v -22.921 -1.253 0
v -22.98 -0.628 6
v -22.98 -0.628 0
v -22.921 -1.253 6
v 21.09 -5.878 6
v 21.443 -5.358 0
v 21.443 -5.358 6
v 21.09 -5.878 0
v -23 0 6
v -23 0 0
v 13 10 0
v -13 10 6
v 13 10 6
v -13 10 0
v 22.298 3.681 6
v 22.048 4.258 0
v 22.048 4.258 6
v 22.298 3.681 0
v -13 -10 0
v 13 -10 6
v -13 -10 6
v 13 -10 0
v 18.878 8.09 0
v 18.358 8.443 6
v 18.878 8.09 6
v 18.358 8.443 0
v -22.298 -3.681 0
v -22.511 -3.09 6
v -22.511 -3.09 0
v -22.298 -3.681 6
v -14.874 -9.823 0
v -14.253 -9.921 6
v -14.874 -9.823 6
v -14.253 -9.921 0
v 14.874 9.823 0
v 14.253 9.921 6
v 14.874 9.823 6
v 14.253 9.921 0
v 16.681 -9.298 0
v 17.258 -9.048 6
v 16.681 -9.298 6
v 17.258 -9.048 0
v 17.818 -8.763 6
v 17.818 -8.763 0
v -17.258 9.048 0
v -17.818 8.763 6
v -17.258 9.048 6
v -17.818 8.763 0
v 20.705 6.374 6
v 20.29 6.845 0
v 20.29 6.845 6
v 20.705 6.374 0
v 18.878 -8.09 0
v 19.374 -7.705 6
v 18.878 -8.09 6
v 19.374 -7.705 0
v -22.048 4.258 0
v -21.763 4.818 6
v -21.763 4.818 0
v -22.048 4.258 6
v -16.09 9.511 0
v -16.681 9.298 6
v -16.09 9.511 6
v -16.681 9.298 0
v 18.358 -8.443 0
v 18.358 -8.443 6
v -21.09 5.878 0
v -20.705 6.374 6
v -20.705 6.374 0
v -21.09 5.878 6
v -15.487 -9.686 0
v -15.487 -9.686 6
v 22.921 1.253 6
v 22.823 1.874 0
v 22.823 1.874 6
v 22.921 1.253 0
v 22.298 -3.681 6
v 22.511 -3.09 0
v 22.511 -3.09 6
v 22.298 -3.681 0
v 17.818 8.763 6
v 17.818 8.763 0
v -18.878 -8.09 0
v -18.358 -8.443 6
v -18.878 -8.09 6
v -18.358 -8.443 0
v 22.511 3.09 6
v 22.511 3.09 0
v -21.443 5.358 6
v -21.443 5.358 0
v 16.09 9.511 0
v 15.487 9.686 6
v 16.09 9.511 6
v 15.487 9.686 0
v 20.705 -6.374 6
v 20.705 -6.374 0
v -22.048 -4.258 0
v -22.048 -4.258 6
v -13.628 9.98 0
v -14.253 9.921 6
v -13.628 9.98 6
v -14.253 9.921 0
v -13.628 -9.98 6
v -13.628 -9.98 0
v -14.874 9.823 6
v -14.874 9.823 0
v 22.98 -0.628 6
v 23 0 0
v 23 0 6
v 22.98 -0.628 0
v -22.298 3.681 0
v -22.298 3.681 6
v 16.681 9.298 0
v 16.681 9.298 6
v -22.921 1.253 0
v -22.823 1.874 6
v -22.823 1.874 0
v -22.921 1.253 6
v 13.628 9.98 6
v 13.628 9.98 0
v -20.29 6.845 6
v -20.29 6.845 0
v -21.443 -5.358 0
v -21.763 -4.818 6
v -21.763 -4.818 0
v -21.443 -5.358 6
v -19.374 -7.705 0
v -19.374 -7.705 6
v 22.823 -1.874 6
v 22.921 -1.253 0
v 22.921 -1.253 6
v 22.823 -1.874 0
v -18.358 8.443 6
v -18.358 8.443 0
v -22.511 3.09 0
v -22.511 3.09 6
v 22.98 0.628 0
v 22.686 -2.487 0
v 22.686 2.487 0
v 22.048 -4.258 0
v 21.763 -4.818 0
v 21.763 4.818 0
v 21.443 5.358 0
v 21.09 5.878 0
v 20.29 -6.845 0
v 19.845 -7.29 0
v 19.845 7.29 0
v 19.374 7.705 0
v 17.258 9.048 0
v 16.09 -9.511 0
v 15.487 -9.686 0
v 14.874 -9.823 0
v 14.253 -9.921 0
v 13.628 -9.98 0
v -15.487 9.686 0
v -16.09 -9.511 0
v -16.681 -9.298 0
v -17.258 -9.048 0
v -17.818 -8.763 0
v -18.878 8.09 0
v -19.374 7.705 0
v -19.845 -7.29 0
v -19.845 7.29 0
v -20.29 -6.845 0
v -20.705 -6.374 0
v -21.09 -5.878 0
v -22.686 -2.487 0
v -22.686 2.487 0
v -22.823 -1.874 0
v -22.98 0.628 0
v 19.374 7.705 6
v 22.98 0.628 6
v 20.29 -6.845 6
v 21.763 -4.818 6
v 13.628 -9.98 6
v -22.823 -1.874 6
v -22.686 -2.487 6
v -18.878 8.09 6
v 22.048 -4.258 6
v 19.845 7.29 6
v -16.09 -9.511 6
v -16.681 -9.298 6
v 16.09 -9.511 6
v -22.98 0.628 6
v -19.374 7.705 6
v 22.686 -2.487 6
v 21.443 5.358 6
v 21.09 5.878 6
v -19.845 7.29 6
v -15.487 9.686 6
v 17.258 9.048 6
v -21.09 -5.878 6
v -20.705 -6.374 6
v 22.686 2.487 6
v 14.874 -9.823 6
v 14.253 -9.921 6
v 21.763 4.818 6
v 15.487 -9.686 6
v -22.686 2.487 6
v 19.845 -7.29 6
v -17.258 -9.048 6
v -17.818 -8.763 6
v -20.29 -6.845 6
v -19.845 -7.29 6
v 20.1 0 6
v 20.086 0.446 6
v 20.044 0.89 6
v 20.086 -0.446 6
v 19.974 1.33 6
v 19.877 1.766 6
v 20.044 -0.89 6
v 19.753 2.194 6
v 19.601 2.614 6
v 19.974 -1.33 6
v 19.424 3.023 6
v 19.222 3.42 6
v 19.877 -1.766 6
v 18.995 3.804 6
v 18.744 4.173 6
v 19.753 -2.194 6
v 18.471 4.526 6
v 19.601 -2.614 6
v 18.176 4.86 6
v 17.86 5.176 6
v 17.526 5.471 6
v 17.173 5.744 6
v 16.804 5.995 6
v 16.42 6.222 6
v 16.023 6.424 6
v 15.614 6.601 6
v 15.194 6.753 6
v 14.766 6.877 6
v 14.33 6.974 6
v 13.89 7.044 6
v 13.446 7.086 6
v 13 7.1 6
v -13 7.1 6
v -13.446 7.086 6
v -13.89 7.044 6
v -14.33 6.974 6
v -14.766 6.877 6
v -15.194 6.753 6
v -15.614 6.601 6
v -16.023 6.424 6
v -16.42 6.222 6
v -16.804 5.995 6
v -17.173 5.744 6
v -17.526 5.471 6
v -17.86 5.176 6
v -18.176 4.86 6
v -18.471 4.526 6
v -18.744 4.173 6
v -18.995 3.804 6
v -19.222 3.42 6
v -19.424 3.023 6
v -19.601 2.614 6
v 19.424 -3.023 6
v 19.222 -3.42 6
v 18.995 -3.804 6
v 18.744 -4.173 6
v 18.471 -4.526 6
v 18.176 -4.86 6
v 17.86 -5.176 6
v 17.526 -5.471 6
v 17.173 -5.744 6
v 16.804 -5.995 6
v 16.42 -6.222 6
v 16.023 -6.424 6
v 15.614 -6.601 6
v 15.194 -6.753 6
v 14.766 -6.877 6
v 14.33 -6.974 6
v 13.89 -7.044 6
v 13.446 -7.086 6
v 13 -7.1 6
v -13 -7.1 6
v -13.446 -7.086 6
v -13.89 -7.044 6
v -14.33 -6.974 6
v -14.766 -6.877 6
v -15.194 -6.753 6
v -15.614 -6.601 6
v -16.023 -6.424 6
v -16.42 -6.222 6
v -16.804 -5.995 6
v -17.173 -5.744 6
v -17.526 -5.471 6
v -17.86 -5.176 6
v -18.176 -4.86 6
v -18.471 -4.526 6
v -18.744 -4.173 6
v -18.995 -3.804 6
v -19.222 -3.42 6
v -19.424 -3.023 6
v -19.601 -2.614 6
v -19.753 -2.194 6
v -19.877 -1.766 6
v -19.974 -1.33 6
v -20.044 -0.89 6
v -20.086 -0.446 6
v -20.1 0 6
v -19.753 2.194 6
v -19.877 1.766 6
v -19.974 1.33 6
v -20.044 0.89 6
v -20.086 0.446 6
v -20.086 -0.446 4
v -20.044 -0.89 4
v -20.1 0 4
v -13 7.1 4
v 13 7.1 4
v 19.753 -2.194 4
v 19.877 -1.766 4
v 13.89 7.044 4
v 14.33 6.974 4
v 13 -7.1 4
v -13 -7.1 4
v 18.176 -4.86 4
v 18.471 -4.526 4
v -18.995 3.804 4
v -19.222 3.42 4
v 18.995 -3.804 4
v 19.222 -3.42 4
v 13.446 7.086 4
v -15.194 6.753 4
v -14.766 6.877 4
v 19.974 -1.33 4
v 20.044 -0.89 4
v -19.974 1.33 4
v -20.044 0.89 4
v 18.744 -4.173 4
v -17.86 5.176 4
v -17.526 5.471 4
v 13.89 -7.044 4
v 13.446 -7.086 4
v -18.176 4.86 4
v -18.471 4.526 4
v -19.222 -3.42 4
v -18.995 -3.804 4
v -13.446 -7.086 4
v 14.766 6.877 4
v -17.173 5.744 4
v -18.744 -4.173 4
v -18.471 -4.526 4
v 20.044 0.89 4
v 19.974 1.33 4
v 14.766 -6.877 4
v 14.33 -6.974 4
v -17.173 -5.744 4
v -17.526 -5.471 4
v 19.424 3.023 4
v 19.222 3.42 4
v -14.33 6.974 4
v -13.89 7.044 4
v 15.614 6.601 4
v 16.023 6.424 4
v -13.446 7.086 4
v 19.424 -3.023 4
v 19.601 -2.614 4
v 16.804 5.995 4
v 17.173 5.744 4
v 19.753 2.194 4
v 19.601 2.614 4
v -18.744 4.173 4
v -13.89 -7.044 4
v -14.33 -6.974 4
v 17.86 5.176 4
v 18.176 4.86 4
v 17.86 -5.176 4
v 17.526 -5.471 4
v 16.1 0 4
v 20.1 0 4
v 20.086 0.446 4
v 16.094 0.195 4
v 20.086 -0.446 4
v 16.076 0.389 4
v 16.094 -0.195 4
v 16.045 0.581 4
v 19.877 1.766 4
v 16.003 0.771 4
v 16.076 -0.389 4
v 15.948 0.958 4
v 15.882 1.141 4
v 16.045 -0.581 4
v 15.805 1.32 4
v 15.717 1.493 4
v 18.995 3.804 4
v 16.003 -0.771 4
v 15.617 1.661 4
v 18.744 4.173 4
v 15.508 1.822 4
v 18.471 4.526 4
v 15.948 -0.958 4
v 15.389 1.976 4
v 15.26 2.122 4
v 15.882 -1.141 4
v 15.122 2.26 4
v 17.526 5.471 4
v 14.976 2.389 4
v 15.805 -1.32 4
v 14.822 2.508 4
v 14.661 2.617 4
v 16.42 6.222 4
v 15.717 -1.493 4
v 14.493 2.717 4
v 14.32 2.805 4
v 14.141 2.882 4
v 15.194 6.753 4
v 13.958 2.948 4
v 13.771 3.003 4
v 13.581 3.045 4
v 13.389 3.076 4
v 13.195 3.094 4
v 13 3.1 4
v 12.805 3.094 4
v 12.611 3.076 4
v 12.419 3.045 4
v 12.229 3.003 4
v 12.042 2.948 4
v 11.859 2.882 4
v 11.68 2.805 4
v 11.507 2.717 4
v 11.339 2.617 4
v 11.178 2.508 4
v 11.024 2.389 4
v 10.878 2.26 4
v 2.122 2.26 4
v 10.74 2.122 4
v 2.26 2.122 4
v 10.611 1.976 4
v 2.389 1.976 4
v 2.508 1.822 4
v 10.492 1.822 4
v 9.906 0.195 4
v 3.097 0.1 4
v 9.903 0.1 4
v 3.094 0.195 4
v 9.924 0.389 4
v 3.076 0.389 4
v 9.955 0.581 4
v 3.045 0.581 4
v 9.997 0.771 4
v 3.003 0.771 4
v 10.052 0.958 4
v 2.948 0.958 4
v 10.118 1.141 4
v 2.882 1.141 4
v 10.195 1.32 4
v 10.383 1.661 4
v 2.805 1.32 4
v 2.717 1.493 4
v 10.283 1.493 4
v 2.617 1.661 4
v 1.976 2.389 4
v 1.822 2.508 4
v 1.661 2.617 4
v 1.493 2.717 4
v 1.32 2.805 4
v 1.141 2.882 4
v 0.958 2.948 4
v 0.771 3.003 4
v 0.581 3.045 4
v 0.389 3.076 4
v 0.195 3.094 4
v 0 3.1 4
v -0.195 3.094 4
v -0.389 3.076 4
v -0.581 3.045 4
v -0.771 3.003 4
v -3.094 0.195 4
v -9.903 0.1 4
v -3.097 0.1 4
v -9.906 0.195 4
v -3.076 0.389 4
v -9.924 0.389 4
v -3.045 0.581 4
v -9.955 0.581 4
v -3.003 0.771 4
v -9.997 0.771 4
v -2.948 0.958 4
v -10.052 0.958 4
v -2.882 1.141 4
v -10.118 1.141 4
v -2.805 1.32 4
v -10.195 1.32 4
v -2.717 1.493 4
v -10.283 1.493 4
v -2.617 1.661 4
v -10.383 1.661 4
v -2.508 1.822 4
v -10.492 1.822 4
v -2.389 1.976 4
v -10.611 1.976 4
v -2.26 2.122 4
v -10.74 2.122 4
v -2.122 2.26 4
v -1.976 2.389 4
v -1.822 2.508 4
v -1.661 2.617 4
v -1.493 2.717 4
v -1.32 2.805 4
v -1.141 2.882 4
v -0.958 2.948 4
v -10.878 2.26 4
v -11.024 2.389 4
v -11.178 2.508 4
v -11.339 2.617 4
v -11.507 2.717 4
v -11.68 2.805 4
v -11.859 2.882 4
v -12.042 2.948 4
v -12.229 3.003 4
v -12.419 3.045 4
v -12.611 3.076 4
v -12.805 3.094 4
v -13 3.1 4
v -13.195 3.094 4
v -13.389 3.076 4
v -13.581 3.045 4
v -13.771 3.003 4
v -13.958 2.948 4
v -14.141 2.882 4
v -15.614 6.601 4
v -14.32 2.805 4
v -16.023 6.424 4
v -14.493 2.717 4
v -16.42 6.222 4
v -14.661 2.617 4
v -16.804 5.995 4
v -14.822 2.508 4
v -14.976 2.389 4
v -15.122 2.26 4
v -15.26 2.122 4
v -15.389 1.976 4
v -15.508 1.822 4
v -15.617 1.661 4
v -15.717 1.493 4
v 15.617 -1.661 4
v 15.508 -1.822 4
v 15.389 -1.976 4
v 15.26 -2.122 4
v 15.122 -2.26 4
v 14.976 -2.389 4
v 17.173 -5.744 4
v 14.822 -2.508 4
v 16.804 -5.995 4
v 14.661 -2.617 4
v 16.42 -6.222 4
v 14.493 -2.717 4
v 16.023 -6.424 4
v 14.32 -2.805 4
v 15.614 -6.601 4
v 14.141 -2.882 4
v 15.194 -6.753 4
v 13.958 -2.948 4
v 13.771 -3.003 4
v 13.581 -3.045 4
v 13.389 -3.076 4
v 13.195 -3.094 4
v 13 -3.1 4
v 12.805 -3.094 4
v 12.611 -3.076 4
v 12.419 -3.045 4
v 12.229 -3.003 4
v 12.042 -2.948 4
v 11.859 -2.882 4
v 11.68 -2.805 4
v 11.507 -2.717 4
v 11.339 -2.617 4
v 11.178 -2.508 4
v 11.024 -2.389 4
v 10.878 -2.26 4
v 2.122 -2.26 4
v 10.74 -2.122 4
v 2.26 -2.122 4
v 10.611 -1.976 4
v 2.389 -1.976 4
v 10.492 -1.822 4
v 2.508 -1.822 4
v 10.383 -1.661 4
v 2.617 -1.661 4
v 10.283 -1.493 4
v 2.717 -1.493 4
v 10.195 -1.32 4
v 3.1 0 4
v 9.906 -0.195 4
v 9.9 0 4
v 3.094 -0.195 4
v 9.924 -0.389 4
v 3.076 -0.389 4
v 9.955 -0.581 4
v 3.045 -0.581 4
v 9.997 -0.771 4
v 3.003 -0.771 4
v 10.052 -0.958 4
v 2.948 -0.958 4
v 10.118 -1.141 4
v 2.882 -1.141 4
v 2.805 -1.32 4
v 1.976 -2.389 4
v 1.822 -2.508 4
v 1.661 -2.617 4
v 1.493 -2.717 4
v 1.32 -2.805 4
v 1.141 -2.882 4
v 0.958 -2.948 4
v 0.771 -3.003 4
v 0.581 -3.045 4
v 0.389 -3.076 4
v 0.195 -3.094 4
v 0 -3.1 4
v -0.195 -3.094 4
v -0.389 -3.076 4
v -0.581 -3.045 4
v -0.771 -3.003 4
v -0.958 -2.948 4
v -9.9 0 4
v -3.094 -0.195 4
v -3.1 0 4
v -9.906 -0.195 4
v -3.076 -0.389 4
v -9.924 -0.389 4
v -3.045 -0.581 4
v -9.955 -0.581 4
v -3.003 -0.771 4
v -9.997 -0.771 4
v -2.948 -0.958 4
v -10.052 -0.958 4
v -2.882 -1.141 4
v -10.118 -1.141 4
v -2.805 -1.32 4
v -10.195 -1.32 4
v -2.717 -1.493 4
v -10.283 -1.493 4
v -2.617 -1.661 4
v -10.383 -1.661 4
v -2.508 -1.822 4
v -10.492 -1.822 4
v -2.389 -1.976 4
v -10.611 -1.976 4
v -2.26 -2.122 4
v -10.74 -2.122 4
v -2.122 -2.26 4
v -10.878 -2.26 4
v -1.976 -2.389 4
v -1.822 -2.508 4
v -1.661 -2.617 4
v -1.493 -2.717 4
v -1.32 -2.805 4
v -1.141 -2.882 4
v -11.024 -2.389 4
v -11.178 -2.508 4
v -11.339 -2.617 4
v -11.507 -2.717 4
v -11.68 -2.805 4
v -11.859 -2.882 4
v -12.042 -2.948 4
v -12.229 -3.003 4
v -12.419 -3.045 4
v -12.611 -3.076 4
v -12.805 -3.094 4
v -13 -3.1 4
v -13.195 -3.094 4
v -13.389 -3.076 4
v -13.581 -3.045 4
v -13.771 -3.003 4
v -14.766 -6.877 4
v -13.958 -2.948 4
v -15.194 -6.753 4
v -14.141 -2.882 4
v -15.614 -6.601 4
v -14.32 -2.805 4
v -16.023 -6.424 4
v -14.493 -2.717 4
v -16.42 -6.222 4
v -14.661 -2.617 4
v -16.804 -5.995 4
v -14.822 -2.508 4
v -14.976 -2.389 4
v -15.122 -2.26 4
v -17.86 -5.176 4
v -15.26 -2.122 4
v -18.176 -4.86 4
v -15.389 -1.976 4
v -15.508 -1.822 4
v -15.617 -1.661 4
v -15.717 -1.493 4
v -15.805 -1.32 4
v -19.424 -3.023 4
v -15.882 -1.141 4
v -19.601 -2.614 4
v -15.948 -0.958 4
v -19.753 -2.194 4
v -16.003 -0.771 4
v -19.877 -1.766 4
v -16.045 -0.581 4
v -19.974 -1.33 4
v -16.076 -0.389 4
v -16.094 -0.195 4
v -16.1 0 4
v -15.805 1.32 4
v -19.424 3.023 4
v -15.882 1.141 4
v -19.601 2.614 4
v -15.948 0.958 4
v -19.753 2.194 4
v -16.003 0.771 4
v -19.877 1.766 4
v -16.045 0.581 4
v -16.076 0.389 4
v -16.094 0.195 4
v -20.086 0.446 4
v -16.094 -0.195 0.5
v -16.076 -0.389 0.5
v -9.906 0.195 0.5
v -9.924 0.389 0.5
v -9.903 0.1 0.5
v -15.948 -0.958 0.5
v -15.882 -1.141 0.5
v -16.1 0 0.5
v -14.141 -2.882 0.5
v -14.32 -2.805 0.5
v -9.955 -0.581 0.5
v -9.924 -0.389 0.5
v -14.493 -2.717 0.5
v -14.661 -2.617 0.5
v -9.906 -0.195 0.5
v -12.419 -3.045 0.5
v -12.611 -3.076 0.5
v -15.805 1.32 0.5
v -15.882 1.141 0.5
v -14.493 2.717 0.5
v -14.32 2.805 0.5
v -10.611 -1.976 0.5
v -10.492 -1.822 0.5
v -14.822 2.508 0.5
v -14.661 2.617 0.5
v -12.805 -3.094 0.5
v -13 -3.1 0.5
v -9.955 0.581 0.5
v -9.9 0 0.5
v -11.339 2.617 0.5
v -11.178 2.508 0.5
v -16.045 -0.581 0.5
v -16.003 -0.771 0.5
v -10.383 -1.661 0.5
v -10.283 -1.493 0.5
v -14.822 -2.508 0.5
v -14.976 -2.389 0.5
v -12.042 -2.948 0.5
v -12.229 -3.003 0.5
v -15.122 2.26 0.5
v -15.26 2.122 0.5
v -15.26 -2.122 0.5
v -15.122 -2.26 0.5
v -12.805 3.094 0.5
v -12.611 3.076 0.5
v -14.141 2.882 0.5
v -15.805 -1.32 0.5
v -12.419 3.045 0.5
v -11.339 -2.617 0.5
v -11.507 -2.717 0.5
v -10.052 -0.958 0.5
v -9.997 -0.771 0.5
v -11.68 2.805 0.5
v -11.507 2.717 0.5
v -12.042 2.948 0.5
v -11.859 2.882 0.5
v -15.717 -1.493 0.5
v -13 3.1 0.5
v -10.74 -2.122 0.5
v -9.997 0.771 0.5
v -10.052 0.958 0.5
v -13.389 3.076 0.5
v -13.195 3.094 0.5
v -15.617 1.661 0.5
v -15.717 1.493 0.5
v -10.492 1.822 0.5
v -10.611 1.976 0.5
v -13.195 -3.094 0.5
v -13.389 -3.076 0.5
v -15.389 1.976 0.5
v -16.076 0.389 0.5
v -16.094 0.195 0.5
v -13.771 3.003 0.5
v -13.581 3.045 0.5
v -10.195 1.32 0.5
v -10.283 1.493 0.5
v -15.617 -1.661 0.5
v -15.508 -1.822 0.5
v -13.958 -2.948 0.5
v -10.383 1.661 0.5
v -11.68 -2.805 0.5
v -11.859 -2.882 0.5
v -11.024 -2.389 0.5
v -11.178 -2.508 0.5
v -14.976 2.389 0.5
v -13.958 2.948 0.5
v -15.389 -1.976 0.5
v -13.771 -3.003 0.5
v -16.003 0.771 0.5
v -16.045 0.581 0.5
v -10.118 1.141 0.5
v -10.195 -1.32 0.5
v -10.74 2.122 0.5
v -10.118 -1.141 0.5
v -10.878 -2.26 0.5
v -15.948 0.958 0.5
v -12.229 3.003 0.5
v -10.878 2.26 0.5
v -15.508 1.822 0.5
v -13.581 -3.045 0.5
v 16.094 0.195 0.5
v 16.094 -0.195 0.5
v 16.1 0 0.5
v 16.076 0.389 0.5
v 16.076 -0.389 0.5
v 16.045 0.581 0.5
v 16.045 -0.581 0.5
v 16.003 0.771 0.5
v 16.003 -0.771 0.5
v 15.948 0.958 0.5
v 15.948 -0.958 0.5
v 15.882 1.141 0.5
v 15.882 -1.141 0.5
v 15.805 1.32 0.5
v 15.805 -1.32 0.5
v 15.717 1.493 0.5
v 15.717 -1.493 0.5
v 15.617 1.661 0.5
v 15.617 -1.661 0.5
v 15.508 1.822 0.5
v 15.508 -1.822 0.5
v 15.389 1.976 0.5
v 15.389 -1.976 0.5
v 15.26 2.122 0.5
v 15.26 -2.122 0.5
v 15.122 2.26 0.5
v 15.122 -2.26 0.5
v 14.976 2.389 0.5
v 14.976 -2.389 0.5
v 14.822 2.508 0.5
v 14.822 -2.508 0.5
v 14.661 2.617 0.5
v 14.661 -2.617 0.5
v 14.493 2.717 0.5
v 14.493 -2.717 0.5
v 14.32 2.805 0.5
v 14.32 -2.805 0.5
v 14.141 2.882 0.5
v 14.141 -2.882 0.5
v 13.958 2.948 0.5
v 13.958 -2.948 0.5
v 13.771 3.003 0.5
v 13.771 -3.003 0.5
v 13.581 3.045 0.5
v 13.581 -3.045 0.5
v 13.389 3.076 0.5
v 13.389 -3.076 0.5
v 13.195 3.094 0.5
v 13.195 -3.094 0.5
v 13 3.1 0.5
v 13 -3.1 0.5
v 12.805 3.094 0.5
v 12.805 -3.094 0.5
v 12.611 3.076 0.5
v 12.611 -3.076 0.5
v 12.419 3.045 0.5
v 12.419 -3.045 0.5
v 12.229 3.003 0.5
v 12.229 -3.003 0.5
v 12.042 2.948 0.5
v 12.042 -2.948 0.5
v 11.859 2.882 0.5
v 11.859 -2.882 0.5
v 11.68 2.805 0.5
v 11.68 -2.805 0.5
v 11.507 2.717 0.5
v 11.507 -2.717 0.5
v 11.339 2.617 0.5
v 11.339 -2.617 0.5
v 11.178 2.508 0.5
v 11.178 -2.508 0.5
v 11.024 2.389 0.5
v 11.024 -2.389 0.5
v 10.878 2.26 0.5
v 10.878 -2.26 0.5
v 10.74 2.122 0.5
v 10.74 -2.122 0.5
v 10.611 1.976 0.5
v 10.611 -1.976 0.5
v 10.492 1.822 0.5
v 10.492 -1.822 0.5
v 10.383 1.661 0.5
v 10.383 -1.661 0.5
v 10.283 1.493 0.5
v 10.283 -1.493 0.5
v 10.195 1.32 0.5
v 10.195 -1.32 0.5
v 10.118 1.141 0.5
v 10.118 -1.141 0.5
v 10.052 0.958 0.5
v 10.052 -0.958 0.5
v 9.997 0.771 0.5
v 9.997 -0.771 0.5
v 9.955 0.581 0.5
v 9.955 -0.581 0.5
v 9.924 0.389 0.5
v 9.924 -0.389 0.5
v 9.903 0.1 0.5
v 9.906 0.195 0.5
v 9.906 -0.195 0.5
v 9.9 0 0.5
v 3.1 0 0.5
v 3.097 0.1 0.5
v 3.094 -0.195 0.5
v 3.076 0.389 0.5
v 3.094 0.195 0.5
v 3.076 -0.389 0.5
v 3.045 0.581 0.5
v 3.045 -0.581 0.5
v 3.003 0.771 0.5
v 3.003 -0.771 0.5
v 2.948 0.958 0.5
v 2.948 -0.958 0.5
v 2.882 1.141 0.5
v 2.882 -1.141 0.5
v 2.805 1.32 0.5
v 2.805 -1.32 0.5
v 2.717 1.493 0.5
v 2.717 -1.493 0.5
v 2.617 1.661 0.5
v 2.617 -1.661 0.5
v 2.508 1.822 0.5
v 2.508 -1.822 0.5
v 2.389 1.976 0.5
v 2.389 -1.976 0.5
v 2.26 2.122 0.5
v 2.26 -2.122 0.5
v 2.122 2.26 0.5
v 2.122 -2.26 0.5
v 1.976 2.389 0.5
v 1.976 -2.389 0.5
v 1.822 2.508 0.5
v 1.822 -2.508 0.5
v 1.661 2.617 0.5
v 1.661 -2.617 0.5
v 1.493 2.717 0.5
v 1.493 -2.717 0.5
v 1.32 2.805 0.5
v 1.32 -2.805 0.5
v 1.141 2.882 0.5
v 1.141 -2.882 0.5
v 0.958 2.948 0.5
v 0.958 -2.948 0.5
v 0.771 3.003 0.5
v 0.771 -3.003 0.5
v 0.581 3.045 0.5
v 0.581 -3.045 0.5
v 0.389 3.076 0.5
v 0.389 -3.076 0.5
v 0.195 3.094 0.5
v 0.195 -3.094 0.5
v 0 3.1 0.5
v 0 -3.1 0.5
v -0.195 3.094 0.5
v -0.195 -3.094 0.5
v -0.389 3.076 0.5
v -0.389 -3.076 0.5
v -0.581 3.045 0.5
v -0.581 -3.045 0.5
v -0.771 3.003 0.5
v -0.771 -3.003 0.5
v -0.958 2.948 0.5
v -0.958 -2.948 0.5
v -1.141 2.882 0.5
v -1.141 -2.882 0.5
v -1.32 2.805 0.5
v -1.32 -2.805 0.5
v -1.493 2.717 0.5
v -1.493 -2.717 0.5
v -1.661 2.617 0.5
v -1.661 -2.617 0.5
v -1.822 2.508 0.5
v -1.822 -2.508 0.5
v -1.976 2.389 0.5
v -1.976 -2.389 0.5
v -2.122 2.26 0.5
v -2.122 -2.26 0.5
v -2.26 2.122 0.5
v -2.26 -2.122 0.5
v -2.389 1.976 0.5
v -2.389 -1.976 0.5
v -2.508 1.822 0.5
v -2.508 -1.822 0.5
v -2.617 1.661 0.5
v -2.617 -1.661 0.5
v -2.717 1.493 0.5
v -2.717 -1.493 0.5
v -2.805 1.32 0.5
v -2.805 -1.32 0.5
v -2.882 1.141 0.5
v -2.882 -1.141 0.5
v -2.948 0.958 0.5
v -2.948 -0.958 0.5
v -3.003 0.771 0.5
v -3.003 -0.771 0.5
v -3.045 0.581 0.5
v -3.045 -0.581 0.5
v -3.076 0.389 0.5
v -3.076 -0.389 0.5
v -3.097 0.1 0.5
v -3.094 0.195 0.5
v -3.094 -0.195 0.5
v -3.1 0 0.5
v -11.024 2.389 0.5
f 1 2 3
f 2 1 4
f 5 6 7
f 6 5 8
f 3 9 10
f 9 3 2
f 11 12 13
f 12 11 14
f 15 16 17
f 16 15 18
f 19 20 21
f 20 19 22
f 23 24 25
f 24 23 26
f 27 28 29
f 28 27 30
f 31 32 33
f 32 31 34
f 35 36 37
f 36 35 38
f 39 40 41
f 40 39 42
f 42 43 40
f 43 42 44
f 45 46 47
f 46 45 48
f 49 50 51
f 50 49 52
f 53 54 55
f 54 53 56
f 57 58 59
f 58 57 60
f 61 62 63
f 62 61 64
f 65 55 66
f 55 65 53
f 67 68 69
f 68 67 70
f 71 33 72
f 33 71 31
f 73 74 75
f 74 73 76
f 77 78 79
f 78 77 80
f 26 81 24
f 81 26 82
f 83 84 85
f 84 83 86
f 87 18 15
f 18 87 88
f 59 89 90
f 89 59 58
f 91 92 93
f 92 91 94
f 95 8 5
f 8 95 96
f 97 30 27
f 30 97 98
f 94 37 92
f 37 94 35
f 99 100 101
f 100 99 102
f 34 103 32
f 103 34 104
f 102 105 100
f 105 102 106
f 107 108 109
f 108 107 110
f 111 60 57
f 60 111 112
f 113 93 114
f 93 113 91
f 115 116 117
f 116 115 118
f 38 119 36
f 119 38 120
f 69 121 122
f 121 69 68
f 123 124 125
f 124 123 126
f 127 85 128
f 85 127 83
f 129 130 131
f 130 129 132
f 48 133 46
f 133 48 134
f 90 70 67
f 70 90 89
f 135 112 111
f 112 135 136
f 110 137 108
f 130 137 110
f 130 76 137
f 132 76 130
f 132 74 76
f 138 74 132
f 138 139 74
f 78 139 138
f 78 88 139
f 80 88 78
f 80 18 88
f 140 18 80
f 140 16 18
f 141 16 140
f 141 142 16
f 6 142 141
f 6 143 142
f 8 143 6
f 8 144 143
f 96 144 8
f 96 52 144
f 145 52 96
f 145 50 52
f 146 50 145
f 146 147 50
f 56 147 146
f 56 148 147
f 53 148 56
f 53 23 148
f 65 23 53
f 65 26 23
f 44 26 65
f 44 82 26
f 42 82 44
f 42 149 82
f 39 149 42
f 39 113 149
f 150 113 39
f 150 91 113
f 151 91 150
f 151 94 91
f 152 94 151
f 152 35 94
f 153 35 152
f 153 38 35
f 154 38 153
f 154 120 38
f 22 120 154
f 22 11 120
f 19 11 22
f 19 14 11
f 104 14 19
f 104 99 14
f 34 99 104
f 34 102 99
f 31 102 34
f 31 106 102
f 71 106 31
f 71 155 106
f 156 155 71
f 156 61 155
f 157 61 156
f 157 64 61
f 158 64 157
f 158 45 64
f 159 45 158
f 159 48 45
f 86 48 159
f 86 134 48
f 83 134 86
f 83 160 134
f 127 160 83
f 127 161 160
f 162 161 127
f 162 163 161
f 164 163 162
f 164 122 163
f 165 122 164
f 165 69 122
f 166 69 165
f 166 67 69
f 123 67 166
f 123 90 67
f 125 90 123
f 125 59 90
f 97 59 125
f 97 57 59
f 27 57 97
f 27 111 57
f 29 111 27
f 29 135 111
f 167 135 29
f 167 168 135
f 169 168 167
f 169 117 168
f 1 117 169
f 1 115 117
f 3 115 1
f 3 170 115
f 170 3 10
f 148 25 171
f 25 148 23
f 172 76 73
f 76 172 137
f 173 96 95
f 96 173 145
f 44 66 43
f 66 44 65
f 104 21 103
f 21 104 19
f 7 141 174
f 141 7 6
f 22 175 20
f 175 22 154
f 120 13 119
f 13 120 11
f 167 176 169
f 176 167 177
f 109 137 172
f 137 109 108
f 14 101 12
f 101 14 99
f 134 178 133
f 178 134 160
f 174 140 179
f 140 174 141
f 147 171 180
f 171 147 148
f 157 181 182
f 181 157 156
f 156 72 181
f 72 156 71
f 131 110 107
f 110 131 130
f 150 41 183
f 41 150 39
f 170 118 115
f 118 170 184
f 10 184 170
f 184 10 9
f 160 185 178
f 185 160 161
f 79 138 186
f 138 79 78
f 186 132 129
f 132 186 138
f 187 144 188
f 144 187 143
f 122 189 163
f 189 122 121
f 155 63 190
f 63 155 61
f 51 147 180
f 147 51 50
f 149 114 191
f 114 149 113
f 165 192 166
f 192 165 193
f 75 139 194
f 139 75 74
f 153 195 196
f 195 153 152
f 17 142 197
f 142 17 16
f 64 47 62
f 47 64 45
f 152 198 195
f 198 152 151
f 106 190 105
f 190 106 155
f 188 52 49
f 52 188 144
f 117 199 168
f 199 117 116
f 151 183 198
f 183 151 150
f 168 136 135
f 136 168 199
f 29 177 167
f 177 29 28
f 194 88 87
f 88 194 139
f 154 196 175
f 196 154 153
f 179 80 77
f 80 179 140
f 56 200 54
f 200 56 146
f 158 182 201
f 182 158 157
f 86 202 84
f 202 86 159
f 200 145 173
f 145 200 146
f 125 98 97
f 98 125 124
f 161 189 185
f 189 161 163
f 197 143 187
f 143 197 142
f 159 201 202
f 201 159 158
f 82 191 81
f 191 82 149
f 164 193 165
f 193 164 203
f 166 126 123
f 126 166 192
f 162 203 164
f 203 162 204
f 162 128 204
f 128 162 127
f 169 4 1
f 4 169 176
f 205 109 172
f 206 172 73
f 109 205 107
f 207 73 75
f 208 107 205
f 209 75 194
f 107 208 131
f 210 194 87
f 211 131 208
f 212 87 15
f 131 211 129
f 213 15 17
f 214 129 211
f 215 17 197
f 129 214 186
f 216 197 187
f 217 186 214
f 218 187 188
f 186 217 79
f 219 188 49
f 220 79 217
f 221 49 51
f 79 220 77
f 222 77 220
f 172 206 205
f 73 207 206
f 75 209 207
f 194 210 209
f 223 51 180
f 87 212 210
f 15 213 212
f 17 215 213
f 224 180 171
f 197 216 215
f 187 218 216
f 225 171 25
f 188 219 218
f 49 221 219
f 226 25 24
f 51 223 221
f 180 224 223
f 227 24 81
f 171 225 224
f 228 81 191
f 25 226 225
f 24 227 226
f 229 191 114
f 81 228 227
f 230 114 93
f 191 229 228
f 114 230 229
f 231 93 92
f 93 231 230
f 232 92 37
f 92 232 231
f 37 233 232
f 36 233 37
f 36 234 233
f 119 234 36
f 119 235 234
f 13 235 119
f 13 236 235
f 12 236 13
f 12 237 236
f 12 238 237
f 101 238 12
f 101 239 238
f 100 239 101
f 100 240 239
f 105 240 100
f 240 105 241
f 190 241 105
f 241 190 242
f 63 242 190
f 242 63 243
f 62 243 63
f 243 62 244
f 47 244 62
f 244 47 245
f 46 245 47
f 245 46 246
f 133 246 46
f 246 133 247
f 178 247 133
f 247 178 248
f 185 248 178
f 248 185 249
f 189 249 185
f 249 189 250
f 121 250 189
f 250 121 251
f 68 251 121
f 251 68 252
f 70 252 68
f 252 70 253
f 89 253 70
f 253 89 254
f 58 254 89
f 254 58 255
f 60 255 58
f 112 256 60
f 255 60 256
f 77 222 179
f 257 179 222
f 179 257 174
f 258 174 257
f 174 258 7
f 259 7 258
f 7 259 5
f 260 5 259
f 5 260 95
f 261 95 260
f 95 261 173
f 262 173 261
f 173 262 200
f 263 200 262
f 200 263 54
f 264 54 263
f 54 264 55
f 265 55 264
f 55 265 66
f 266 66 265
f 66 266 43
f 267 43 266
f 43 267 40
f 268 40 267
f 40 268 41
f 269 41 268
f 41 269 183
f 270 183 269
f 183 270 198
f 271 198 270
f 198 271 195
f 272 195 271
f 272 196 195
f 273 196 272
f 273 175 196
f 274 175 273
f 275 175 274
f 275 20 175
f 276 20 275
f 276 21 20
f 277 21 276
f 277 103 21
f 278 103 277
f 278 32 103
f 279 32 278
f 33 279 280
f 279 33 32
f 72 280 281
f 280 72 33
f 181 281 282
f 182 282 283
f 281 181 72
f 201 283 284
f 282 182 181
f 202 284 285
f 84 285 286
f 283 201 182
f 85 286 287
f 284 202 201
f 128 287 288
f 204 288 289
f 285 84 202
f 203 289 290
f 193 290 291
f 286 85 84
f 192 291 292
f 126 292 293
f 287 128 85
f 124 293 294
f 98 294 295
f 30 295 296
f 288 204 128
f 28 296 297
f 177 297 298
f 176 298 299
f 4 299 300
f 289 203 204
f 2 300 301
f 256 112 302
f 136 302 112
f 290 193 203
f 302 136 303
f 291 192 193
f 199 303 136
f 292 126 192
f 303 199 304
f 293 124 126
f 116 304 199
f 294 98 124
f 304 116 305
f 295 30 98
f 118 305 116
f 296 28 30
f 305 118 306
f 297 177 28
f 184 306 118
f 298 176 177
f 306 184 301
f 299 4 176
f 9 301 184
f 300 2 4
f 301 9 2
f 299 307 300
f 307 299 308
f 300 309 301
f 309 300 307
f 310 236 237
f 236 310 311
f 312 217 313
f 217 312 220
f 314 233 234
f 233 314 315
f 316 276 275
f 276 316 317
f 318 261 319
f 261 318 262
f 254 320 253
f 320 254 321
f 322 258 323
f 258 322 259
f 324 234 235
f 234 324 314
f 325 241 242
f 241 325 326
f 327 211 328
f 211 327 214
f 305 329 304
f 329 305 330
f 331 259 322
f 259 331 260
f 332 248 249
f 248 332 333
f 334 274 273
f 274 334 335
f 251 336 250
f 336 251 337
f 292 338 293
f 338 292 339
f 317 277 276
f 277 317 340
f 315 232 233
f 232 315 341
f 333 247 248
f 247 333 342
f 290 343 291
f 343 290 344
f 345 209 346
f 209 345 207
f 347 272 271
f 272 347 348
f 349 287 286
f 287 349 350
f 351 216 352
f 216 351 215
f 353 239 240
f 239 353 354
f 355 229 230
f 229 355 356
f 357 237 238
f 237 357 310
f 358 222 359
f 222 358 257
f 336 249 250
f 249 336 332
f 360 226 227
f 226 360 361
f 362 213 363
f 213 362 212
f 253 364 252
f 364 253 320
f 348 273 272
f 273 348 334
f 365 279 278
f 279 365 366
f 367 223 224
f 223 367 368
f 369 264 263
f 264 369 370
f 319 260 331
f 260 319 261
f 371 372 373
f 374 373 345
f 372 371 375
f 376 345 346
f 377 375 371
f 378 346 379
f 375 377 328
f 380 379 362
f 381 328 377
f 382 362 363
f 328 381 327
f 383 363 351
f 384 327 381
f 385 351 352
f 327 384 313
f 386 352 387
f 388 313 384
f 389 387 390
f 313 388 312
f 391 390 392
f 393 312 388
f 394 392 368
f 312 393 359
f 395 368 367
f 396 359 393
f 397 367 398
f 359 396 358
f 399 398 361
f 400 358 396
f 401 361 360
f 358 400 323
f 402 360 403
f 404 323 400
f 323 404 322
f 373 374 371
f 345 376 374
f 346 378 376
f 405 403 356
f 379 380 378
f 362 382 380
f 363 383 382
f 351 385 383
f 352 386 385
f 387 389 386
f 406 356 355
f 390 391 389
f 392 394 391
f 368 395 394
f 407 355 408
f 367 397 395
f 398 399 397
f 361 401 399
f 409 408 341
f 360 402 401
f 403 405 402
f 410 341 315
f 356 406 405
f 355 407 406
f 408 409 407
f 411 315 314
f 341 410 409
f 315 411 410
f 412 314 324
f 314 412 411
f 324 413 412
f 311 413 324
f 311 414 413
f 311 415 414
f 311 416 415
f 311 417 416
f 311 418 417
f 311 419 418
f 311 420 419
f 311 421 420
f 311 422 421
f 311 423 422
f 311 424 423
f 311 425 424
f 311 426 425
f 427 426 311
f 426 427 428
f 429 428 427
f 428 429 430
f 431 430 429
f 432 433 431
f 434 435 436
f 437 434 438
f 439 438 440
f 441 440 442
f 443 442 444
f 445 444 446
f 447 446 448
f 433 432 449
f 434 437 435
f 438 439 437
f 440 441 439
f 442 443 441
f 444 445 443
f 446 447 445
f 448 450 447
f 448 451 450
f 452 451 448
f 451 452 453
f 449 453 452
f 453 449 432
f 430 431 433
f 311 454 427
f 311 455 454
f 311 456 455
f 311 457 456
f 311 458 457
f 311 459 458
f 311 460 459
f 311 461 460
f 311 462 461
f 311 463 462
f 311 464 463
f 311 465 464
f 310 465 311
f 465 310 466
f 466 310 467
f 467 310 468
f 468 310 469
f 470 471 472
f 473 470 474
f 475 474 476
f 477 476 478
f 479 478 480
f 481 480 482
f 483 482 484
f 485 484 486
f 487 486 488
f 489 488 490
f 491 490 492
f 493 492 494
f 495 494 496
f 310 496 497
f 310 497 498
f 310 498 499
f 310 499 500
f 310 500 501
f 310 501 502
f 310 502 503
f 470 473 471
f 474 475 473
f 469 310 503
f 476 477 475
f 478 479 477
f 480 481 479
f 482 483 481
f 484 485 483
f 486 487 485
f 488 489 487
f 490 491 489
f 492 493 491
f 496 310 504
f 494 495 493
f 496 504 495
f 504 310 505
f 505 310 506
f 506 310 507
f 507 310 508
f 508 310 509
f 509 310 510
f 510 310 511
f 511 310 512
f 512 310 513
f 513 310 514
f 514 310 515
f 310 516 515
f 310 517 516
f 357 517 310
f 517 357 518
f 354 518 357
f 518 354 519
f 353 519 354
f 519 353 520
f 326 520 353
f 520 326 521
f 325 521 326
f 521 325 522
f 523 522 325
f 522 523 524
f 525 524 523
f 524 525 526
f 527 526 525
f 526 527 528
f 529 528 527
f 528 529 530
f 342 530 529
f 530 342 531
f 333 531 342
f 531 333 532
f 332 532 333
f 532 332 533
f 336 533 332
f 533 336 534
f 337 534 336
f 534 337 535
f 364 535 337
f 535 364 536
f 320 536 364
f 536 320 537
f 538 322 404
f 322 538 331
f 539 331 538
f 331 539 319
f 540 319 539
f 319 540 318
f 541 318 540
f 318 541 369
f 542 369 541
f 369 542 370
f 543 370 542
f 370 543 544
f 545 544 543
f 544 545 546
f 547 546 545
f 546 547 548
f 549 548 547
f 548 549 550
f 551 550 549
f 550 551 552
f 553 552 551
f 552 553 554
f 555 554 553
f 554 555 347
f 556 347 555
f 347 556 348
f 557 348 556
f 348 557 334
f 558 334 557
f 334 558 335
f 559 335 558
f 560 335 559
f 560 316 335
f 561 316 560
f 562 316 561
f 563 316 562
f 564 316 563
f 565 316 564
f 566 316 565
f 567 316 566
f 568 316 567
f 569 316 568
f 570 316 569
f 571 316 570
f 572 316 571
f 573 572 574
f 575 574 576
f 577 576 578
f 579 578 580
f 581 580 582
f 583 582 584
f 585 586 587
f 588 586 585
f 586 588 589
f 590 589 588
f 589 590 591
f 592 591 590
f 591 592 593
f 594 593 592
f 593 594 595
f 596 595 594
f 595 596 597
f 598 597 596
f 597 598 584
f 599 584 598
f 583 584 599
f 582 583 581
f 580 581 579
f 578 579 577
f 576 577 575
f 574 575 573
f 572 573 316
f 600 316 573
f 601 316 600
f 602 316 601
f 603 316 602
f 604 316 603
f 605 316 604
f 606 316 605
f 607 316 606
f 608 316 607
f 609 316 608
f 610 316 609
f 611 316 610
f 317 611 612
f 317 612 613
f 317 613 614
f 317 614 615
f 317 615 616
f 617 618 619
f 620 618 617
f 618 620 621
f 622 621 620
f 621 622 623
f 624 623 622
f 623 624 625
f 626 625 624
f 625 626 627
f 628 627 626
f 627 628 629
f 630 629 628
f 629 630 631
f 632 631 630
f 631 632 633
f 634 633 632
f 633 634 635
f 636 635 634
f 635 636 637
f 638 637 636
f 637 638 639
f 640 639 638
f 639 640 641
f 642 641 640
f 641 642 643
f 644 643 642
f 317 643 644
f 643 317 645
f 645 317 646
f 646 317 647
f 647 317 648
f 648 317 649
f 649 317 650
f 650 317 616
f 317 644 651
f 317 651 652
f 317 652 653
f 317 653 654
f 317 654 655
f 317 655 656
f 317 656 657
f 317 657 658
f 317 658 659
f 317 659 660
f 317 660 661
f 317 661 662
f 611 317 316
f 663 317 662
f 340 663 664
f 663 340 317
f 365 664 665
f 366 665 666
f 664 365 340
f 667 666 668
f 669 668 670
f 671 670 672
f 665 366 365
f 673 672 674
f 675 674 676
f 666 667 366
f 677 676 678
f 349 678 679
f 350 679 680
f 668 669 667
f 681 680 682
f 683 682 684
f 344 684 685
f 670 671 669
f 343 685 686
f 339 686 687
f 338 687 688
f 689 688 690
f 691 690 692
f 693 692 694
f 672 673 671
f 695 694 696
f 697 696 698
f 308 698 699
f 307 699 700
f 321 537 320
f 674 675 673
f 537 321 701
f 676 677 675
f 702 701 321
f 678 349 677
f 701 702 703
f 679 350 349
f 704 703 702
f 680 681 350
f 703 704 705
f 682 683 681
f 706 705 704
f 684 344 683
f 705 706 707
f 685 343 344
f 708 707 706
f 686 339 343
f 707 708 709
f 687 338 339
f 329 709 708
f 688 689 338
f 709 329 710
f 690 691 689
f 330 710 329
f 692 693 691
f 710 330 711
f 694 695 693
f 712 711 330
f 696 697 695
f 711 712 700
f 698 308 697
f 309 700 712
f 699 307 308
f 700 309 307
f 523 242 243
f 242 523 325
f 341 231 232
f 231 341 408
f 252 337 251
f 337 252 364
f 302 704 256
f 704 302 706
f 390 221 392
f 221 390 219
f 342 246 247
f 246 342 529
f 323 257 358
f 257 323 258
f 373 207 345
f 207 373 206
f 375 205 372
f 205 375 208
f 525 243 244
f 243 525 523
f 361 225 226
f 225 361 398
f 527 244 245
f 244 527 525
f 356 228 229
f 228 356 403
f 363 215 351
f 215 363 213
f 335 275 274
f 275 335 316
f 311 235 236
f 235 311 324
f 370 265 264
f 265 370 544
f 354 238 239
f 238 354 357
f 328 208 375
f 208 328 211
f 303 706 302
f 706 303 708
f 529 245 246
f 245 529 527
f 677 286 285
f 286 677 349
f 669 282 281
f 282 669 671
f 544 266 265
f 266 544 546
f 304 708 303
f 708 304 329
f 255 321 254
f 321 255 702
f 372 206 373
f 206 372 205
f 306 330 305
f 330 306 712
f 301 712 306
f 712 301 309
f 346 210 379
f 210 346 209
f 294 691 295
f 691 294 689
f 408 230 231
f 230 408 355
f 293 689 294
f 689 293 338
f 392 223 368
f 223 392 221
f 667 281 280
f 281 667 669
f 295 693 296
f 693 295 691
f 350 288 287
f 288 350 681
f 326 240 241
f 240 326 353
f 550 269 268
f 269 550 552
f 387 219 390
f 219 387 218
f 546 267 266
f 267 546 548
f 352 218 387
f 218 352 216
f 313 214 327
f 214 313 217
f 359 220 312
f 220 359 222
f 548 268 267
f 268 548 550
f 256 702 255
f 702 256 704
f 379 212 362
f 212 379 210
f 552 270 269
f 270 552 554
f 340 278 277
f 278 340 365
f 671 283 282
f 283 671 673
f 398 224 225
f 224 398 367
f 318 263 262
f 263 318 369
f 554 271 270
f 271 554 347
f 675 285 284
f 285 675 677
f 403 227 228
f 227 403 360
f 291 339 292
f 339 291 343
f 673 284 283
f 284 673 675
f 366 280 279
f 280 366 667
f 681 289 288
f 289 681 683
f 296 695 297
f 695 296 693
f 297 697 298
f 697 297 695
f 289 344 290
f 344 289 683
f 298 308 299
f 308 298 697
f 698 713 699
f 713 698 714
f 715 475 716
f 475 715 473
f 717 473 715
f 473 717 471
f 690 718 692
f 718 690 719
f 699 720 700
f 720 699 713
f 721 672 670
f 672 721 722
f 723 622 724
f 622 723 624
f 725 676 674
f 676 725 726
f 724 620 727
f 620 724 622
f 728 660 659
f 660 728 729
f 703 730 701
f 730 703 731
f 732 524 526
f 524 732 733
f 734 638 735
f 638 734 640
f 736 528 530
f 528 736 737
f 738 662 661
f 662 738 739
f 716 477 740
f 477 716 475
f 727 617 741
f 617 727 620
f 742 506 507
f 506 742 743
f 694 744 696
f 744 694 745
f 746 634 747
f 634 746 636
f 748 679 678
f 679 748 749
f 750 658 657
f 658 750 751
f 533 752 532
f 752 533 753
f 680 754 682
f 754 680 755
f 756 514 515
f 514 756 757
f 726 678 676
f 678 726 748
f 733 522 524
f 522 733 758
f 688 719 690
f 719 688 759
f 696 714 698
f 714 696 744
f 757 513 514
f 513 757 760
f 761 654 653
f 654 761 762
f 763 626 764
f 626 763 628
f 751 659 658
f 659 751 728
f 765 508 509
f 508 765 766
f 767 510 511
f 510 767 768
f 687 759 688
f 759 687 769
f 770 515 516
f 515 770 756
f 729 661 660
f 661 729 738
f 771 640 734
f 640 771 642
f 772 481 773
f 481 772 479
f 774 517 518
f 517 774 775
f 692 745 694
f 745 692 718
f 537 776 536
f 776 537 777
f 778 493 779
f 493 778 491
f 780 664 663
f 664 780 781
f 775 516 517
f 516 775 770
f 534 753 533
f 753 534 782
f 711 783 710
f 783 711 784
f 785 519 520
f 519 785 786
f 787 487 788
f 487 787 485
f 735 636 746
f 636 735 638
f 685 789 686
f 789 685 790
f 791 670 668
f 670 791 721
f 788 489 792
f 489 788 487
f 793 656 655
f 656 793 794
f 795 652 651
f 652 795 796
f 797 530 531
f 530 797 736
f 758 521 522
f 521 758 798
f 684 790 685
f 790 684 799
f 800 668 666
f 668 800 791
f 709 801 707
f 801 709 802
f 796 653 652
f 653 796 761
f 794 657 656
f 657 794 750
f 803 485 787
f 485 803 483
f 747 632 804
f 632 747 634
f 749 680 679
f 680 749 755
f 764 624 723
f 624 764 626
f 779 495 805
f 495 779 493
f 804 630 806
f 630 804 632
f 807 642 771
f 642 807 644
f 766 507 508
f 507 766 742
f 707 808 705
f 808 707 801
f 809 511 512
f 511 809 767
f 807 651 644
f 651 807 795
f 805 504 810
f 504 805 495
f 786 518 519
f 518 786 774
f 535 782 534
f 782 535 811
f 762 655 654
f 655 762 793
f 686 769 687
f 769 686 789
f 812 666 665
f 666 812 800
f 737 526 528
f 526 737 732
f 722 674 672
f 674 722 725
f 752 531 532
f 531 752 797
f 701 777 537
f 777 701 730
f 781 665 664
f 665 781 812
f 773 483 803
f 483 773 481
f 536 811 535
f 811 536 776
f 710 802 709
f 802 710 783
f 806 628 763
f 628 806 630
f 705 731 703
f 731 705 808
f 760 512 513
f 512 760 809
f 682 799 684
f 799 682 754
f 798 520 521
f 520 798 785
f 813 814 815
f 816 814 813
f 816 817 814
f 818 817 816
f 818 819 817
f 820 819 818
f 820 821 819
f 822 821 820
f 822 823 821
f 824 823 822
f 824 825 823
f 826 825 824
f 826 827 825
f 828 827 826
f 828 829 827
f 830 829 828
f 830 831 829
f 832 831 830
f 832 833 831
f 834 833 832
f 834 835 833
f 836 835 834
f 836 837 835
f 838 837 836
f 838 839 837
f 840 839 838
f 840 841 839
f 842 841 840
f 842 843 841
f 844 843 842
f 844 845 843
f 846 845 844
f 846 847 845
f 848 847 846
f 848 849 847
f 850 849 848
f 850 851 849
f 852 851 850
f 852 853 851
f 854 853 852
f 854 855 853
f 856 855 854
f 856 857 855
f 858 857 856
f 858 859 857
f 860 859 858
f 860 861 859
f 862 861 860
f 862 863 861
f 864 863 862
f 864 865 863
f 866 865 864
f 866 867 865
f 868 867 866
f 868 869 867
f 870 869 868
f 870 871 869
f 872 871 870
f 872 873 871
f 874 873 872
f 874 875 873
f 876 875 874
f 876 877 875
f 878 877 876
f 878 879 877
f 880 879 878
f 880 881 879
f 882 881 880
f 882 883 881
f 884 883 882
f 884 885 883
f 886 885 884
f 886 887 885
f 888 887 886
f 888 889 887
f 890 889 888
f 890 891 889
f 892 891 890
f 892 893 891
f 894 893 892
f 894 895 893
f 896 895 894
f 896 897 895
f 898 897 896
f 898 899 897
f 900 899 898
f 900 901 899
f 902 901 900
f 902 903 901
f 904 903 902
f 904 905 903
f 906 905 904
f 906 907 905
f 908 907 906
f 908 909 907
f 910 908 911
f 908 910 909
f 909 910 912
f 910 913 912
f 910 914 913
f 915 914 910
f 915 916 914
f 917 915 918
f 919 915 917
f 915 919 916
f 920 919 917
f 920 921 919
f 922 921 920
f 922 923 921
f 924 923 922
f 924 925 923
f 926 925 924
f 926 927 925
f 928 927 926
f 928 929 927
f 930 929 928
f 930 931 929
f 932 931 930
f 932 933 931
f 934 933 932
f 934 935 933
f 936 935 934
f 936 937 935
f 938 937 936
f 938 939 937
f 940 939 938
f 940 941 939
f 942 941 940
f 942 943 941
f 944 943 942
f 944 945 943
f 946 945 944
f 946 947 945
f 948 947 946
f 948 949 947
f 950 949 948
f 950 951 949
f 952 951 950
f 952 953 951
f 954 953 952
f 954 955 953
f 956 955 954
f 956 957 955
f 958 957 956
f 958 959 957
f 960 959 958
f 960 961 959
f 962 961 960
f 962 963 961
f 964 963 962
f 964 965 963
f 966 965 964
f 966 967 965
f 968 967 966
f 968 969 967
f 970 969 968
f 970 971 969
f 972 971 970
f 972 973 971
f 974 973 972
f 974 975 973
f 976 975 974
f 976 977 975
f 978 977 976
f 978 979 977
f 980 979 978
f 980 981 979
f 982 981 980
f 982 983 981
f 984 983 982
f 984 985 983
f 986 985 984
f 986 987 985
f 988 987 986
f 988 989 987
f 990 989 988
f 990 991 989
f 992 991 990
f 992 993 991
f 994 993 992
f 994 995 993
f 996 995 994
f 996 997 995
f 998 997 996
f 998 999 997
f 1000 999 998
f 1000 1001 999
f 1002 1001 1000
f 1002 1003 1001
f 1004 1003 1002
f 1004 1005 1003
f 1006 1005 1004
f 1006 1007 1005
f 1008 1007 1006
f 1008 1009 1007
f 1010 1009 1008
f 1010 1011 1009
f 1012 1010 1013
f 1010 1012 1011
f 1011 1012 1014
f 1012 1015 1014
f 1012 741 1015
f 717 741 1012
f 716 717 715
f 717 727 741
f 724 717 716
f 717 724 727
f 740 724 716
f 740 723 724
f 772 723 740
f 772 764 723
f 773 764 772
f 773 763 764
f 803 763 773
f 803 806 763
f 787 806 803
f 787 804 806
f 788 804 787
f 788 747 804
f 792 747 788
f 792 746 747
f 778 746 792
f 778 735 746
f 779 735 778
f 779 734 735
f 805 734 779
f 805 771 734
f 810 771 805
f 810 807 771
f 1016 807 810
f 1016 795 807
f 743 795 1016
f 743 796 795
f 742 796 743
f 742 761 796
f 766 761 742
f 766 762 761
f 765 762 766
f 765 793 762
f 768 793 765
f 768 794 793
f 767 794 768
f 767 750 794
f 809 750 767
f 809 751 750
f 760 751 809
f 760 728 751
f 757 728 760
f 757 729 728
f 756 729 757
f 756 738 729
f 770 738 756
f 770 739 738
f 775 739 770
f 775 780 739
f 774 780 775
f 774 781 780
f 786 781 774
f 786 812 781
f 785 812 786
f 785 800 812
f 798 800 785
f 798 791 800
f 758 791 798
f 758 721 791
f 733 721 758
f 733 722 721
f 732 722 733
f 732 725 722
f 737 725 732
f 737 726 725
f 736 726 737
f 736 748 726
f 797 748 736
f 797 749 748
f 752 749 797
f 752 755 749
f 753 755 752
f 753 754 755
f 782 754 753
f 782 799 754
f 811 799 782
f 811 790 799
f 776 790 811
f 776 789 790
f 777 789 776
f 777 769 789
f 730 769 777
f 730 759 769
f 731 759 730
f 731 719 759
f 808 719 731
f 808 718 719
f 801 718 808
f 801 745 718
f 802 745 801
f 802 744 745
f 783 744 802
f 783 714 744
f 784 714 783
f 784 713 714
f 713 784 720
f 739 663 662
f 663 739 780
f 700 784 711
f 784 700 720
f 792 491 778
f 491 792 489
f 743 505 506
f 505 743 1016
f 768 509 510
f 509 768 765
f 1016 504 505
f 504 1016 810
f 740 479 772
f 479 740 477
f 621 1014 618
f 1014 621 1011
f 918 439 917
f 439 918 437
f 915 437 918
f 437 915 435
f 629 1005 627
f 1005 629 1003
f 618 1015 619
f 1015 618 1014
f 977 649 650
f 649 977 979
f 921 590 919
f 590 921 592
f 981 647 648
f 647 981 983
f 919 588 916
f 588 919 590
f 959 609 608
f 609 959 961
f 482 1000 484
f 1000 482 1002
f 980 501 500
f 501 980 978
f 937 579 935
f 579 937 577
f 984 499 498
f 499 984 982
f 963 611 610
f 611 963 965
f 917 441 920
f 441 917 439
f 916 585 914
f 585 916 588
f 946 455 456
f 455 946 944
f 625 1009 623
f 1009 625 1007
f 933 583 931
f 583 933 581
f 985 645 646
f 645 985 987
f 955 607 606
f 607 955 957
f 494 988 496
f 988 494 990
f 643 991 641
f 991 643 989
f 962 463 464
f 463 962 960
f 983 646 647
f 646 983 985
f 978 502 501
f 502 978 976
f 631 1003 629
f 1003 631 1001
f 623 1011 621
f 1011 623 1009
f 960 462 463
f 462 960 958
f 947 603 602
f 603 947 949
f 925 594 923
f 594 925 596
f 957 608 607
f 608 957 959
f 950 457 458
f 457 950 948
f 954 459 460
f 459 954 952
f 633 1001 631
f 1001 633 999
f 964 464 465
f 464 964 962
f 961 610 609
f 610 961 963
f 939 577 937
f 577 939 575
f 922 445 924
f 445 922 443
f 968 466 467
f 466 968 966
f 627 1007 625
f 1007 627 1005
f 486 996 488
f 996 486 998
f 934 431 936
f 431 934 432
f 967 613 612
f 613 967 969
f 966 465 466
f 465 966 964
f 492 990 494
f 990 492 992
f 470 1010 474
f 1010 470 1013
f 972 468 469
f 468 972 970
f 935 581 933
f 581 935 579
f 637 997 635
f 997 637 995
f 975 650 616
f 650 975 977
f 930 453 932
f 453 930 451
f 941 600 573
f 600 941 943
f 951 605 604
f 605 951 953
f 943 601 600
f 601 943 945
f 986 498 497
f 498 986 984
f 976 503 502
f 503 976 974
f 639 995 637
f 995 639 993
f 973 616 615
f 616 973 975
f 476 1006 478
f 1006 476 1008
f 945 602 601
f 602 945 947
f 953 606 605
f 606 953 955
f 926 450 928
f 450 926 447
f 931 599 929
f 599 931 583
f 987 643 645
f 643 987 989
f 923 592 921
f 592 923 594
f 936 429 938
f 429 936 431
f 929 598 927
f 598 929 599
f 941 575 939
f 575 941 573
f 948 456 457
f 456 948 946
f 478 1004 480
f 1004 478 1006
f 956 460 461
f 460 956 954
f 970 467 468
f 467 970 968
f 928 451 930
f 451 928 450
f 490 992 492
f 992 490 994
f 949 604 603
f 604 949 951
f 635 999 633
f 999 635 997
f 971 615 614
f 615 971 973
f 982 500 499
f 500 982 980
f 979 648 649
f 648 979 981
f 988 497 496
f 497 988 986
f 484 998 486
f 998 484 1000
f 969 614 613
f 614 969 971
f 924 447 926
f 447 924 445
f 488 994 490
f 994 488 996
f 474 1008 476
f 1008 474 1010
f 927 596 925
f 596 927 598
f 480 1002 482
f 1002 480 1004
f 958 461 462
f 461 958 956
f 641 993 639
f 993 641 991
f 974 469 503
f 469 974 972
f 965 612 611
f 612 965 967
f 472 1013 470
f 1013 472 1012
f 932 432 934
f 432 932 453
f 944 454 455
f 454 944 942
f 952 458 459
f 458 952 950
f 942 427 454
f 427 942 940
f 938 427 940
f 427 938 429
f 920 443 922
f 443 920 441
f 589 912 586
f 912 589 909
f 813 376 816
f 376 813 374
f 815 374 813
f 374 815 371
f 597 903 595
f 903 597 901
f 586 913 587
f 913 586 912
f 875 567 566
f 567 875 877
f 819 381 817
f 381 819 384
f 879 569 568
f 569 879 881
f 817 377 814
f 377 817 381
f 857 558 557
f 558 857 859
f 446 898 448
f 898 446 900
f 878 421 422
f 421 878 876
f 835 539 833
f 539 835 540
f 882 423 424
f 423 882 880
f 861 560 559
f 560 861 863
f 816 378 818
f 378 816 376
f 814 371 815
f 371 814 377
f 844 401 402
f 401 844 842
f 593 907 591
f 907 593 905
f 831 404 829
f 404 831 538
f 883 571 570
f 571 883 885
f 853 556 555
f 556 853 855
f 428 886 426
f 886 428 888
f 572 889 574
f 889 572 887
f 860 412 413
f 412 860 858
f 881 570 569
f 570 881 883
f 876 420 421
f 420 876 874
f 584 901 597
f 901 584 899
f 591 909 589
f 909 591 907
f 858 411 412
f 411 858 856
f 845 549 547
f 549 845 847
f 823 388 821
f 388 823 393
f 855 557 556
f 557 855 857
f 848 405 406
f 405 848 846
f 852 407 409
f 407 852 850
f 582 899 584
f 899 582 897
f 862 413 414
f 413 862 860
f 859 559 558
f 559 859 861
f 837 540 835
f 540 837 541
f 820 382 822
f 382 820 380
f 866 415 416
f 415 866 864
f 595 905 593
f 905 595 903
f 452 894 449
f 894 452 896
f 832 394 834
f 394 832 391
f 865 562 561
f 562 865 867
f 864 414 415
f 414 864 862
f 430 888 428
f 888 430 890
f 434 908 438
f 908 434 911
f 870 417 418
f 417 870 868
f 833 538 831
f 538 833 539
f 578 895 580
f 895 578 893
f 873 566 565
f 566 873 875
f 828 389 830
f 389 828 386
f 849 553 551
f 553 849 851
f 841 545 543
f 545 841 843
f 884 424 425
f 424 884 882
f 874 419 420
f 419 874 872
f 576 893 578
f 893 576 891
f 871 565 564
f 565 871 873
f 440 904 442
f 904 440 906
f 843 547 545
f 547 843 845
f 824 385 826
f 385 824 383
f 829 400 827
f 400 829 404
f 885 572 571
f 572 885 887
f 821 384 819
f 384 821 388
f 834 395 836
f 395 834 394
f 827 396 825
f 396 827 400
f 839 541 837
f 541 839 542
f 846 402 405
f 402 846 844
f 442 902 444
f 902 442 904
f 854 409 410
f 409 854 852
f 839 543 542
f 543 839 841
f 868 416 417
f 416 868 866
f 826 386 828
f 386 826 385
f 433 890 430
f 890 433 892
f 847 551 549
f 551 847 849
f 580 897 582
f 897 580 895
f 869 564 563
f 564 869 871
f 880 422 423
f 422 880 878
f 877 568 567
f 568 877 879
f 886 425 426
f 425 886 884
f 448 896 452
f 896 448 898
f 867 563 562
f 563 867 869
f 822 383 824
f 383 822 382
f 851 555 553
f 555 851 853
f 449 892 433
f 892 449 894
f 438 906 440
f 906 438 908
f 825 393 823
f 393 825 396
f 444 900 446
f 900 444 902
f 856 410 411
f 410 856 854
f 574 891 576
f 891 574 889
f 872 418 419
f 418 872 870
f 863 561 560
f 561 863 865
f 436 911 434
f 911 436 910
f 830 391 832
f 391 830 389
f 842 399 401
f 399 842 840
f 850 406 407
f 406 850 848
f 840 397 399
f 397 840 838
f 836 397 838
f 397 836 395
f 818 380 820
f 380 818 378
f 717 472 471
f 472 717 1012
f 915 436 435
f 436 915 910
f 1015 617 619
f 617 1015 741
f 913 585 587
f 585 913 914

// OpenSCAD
difference(){
    linear_extrude(6) hull(){
        translate([-13,0,0]) circle(10,$fn=100);
        translate([13,0,0]) circle(10,$fn=100);
    }
    translate([0,0,4]) linear_extrude(2) color("red") hull() {
        translate([-13,0,0]) circle(7.1,$fn=100);
        translate([13,0,0])  circle(7.1,$fn=100);
    }
    // 磁石埋め込み穴
    translate([-13,0,0.5]) linear_extrude(4) circle(3.1,$fn=100);
    translate([0,0,0.5]) linear_extrude(4) circle(3.1,$fn=100);
    translate([13,0,0.5]) linear_extrude(4) circle(3.1,$fn=100);
    // 穴強化スリット
    translate([-10,0,0.5]) linear_extrude(4) square([20,0.1]);
}
